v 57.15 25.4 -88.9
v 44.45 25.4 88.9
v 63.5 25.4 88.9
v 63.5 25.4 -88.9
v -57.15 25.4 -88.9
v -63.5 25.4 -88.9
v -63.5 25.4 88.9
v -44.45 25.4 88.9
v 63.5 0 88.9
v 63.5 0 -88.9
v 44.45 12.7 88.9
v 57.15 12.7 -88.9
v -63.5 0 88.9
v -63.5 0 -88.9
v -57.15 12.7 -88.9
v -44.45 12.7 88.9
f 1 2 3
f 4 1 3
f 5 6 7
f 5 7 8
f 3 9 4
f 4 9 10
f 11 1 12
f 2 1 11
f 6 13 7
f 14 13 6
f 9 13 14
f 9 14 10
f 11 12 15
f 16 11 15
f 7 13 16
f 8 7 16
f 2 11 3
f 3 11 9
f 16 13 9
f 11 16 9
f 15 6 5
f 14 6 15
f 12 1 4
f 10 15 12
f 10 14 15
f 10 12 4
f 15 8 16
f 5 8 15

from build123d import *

# Parameters (mm, degrees)
SKETCH1_W           = 127
SKETCH1_H           = 177.8
BOSS_EXTRUDE1_DEPTH = 25.4
CUT_EXTRUDE2_DEPTH  = 12.7


with BuildPart() as part:
    # Sketch1 → Boss-Extrude1 (new body)
    with BuildSketch(Plane(origin=(0, 0, 0), x_dir=(1, 0, 0), z_dir=(0, 1, 0))):
        Rectangle(SKETCH1_W, SKETCH1_H)
    extrude(amount=BOSS_EXTRUDE1_DEPTH)

    # Sketch2 → Cut-Extrude2 (cut)
    with BuildSketch(Plane(origin=(0, 25.4, 0), x_dir=(1, 0, 0), z_dir=(0, 1, 0))):
        Polygon((-57.15, 88.9), (57.15, 88.9), (44.45, -88.9), (-44.45, -88.9), align=None)
    extrude(amount=-CUT_EXTRUDE2_DEPTH, mode=Mode.SUBTRACT)


solid = part.part
